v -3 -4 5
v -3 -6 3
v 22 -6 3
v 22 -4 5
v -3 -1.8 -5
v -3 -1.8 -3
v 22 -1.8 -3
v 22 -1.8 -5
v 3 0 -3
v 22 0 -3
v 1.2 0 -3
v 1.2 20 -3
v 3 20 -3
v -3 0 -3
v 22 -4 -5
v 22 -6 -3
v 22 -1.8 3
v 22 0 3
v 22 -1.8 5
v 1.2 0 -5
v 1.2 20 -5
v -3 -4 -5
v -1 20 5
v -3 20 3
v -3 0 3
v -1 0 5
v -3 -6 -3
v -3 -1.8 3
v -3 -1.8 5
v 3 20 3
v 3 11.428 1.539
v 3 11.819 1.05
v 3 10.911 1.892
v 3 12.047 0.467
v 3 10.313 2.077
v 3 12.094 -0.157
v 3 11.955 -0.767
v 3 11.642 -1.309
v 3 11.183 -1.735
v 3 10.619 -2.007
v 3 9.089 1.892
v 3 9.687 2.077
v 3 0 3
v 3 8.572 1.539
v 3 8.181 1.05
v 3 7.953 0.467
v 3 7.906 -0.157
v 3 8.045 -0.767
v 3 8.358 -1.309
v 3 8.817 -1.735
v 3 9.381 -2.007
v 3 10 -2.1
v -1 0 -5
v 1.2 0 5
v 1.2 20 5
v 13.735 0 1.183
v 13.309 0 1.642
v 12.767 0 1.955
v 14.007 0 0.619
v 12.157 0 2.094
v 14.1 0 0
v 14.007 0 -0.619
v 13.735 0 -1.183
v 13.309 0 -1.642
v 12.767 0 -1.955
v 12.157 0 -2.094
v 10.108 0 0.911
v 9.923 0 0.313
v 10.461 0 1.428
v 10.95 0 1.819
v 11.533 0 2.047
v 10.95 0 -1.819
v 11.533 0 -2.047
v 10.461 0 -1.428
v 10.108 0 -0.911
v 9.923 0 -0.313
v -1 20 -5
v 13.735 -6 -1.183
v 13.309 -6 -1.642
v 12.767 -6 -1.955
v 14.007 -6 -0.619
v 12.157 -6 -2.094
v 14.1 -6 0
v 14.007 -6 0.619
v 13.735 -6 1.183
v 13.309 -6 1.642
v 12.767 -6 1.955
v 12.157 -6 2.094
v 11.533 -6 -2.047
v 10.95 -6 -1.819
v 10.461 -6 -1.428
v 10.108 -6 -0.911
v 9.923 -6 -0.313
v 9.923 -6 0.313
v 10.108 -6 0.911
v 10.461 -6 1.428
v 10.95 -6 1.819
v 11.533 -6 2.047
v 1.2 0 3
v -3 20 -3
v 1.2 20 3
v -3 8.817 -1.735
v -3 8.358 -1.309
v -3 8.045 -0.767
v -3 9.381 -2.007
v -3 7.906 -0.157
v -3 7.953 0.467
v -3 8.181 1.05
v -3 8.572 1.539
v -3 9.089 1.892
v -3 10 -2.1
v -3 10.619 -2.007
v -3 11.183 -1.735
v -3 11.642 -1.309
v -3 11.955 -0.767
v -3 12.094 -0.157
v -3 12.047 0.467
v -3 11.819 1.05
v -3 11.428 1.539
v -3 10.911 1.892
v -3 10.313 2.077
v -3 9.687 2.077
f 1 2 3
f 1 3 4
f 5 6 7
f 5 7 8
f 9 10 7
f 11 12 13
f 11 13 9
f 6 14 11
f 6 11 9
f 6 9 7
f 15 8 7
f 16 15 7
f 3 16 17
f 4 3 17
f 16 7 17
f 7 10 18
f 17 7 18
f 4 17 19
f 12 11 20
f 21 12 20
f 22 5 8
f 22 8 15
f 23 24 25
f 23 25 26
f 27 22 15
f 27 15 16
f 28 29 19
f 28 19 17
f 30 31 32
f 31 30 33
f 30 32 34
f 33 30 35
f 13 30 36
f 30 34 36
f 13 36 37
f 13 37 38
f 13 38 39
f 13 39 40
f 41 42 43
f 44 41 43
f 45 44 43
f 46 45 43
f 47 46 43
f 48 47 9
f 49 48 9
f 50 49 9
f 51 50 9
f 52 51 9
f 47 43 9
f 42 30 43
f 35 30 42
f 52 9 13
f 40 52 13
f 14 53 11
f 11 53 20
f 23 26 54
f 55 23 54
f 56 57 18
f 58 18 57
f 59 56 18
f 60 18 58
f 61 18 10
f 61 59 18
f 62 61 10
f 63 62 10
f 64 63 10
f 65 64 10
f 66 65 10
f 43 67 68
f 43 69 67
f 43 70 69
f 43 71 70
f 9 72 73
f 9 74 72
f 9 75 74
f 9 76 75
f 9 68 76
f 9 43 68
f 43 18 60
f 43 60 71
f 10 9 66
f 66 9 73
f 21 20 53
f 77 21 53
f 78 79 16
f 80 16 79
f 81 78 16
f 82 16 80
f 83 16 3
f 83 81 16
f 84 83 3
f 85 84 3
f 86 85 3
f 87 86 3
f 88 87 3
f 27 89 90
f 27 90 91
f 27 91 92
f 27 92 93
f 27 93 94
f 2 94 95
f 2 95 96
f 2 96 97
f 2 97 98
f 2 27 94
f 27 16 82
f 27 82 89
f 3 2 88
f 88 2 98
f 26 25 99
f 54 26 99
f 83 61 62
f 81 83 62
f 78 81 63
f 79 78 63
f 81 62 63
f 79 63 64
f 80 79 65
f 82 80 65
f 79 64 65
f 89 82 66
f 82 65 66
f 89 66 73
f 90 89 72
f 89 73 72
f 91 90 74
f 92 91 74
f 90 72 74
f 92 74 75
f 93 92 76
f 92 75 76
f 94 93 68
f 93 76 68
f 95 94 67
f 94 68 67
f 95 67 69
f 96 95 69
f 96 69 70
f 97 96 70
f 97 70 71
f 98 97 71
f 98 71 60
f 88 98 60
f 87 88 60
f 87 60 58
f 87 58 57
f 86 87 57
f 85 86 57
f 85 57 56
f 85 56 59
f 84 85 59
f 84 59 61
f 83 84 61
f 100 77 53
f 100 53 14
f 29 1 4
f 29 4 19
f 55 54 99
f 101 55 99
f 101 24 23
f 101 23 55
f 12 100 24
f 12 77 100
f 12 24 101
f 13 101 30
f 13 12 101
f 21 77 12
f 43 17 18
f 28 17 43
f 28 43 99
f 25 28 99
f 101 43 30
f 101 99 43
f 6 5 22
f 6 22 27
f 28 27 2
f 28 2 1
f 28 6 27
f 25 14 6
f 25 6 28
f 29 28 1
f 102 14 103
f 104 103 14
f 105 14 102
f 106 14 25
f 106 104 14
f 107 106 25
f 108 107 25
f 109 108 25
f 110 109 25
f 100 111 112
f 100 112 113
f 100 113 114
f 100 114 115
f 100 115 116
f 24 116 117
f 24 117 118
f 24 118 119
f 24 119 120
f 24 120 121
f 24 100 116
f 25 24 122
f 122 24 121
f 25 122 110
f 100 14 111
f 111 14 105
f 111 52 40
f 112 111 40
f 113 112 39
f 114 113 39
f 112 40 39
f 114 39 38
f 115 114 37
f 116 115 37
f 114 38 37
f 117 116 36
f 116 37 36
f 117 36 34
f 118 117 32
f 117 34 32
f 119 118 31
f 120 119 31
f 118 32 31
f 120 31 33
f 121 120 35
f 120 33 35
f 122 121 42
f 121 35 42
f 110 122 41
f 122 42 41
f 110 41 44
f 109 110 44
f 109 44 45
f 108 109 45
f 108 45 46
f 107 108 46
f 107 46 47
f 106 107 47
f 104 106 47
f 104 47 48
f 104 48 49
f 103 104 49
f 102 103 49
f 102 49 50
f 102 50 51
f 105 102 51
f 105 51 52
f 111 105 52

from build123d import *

# Parameters (mm, degrees)
EXTRUDE_1_DEPTH    = 20
EXTRUDE_2_DEPTH    = 25
HOLE_WIZARD_M5_1_D = 4.2
HOLE_WIZARD_M5_2_D = 4.2


with BuildPart() as part:
    # 草图1 → 凸台-拉伸1 (new body)
    with BuildSketch(Plane(origin=(0, 0, 0), x_dir=(1, 0, 0), z_dir=(0, 1, 0))):
        Polygon((-3, 3), (-3, -3), (-1, -5), (1.2, -5), (1.2, -3), (3, -3), (3, 3), (1.2, 3), (1.2, 5), (-1, 5), align=None)
    extrude(amount=EXTRUDE_1_DEPTH)

    # 草图3 → 凸台-拉伸2 (add)
    with BuildSketch(Plane.ZY.offset(3)):
        Polygon((-3, -6), (3, -6), (5, -4), (5, -1.8), (3, -1.8), (3, 0), (-3, 0), (-3, -1.8), (-5, -1.8), (-5, -4), align=None)
    extrude(amount=-EXTRUDE_2_DEPTH)

    # M5 螺纹孔1 (through all)
    with Locations(Plane.ZY.offset(3)):
        with Locations((0, 10)):
            Hole(HOLE_WIZARD_M5_1_D / 2)

    # M5 螺纹孔2 (through all)
    with Locations(Plane(origin=(0, -6, 0), x_dir=(-1, 0, 0), z_dir=(0, -1, 0))):
        with Locations((-12, 0)):
            Hole(HOLE_WIZARD_M5_2_D / 2)


solid = part.part
